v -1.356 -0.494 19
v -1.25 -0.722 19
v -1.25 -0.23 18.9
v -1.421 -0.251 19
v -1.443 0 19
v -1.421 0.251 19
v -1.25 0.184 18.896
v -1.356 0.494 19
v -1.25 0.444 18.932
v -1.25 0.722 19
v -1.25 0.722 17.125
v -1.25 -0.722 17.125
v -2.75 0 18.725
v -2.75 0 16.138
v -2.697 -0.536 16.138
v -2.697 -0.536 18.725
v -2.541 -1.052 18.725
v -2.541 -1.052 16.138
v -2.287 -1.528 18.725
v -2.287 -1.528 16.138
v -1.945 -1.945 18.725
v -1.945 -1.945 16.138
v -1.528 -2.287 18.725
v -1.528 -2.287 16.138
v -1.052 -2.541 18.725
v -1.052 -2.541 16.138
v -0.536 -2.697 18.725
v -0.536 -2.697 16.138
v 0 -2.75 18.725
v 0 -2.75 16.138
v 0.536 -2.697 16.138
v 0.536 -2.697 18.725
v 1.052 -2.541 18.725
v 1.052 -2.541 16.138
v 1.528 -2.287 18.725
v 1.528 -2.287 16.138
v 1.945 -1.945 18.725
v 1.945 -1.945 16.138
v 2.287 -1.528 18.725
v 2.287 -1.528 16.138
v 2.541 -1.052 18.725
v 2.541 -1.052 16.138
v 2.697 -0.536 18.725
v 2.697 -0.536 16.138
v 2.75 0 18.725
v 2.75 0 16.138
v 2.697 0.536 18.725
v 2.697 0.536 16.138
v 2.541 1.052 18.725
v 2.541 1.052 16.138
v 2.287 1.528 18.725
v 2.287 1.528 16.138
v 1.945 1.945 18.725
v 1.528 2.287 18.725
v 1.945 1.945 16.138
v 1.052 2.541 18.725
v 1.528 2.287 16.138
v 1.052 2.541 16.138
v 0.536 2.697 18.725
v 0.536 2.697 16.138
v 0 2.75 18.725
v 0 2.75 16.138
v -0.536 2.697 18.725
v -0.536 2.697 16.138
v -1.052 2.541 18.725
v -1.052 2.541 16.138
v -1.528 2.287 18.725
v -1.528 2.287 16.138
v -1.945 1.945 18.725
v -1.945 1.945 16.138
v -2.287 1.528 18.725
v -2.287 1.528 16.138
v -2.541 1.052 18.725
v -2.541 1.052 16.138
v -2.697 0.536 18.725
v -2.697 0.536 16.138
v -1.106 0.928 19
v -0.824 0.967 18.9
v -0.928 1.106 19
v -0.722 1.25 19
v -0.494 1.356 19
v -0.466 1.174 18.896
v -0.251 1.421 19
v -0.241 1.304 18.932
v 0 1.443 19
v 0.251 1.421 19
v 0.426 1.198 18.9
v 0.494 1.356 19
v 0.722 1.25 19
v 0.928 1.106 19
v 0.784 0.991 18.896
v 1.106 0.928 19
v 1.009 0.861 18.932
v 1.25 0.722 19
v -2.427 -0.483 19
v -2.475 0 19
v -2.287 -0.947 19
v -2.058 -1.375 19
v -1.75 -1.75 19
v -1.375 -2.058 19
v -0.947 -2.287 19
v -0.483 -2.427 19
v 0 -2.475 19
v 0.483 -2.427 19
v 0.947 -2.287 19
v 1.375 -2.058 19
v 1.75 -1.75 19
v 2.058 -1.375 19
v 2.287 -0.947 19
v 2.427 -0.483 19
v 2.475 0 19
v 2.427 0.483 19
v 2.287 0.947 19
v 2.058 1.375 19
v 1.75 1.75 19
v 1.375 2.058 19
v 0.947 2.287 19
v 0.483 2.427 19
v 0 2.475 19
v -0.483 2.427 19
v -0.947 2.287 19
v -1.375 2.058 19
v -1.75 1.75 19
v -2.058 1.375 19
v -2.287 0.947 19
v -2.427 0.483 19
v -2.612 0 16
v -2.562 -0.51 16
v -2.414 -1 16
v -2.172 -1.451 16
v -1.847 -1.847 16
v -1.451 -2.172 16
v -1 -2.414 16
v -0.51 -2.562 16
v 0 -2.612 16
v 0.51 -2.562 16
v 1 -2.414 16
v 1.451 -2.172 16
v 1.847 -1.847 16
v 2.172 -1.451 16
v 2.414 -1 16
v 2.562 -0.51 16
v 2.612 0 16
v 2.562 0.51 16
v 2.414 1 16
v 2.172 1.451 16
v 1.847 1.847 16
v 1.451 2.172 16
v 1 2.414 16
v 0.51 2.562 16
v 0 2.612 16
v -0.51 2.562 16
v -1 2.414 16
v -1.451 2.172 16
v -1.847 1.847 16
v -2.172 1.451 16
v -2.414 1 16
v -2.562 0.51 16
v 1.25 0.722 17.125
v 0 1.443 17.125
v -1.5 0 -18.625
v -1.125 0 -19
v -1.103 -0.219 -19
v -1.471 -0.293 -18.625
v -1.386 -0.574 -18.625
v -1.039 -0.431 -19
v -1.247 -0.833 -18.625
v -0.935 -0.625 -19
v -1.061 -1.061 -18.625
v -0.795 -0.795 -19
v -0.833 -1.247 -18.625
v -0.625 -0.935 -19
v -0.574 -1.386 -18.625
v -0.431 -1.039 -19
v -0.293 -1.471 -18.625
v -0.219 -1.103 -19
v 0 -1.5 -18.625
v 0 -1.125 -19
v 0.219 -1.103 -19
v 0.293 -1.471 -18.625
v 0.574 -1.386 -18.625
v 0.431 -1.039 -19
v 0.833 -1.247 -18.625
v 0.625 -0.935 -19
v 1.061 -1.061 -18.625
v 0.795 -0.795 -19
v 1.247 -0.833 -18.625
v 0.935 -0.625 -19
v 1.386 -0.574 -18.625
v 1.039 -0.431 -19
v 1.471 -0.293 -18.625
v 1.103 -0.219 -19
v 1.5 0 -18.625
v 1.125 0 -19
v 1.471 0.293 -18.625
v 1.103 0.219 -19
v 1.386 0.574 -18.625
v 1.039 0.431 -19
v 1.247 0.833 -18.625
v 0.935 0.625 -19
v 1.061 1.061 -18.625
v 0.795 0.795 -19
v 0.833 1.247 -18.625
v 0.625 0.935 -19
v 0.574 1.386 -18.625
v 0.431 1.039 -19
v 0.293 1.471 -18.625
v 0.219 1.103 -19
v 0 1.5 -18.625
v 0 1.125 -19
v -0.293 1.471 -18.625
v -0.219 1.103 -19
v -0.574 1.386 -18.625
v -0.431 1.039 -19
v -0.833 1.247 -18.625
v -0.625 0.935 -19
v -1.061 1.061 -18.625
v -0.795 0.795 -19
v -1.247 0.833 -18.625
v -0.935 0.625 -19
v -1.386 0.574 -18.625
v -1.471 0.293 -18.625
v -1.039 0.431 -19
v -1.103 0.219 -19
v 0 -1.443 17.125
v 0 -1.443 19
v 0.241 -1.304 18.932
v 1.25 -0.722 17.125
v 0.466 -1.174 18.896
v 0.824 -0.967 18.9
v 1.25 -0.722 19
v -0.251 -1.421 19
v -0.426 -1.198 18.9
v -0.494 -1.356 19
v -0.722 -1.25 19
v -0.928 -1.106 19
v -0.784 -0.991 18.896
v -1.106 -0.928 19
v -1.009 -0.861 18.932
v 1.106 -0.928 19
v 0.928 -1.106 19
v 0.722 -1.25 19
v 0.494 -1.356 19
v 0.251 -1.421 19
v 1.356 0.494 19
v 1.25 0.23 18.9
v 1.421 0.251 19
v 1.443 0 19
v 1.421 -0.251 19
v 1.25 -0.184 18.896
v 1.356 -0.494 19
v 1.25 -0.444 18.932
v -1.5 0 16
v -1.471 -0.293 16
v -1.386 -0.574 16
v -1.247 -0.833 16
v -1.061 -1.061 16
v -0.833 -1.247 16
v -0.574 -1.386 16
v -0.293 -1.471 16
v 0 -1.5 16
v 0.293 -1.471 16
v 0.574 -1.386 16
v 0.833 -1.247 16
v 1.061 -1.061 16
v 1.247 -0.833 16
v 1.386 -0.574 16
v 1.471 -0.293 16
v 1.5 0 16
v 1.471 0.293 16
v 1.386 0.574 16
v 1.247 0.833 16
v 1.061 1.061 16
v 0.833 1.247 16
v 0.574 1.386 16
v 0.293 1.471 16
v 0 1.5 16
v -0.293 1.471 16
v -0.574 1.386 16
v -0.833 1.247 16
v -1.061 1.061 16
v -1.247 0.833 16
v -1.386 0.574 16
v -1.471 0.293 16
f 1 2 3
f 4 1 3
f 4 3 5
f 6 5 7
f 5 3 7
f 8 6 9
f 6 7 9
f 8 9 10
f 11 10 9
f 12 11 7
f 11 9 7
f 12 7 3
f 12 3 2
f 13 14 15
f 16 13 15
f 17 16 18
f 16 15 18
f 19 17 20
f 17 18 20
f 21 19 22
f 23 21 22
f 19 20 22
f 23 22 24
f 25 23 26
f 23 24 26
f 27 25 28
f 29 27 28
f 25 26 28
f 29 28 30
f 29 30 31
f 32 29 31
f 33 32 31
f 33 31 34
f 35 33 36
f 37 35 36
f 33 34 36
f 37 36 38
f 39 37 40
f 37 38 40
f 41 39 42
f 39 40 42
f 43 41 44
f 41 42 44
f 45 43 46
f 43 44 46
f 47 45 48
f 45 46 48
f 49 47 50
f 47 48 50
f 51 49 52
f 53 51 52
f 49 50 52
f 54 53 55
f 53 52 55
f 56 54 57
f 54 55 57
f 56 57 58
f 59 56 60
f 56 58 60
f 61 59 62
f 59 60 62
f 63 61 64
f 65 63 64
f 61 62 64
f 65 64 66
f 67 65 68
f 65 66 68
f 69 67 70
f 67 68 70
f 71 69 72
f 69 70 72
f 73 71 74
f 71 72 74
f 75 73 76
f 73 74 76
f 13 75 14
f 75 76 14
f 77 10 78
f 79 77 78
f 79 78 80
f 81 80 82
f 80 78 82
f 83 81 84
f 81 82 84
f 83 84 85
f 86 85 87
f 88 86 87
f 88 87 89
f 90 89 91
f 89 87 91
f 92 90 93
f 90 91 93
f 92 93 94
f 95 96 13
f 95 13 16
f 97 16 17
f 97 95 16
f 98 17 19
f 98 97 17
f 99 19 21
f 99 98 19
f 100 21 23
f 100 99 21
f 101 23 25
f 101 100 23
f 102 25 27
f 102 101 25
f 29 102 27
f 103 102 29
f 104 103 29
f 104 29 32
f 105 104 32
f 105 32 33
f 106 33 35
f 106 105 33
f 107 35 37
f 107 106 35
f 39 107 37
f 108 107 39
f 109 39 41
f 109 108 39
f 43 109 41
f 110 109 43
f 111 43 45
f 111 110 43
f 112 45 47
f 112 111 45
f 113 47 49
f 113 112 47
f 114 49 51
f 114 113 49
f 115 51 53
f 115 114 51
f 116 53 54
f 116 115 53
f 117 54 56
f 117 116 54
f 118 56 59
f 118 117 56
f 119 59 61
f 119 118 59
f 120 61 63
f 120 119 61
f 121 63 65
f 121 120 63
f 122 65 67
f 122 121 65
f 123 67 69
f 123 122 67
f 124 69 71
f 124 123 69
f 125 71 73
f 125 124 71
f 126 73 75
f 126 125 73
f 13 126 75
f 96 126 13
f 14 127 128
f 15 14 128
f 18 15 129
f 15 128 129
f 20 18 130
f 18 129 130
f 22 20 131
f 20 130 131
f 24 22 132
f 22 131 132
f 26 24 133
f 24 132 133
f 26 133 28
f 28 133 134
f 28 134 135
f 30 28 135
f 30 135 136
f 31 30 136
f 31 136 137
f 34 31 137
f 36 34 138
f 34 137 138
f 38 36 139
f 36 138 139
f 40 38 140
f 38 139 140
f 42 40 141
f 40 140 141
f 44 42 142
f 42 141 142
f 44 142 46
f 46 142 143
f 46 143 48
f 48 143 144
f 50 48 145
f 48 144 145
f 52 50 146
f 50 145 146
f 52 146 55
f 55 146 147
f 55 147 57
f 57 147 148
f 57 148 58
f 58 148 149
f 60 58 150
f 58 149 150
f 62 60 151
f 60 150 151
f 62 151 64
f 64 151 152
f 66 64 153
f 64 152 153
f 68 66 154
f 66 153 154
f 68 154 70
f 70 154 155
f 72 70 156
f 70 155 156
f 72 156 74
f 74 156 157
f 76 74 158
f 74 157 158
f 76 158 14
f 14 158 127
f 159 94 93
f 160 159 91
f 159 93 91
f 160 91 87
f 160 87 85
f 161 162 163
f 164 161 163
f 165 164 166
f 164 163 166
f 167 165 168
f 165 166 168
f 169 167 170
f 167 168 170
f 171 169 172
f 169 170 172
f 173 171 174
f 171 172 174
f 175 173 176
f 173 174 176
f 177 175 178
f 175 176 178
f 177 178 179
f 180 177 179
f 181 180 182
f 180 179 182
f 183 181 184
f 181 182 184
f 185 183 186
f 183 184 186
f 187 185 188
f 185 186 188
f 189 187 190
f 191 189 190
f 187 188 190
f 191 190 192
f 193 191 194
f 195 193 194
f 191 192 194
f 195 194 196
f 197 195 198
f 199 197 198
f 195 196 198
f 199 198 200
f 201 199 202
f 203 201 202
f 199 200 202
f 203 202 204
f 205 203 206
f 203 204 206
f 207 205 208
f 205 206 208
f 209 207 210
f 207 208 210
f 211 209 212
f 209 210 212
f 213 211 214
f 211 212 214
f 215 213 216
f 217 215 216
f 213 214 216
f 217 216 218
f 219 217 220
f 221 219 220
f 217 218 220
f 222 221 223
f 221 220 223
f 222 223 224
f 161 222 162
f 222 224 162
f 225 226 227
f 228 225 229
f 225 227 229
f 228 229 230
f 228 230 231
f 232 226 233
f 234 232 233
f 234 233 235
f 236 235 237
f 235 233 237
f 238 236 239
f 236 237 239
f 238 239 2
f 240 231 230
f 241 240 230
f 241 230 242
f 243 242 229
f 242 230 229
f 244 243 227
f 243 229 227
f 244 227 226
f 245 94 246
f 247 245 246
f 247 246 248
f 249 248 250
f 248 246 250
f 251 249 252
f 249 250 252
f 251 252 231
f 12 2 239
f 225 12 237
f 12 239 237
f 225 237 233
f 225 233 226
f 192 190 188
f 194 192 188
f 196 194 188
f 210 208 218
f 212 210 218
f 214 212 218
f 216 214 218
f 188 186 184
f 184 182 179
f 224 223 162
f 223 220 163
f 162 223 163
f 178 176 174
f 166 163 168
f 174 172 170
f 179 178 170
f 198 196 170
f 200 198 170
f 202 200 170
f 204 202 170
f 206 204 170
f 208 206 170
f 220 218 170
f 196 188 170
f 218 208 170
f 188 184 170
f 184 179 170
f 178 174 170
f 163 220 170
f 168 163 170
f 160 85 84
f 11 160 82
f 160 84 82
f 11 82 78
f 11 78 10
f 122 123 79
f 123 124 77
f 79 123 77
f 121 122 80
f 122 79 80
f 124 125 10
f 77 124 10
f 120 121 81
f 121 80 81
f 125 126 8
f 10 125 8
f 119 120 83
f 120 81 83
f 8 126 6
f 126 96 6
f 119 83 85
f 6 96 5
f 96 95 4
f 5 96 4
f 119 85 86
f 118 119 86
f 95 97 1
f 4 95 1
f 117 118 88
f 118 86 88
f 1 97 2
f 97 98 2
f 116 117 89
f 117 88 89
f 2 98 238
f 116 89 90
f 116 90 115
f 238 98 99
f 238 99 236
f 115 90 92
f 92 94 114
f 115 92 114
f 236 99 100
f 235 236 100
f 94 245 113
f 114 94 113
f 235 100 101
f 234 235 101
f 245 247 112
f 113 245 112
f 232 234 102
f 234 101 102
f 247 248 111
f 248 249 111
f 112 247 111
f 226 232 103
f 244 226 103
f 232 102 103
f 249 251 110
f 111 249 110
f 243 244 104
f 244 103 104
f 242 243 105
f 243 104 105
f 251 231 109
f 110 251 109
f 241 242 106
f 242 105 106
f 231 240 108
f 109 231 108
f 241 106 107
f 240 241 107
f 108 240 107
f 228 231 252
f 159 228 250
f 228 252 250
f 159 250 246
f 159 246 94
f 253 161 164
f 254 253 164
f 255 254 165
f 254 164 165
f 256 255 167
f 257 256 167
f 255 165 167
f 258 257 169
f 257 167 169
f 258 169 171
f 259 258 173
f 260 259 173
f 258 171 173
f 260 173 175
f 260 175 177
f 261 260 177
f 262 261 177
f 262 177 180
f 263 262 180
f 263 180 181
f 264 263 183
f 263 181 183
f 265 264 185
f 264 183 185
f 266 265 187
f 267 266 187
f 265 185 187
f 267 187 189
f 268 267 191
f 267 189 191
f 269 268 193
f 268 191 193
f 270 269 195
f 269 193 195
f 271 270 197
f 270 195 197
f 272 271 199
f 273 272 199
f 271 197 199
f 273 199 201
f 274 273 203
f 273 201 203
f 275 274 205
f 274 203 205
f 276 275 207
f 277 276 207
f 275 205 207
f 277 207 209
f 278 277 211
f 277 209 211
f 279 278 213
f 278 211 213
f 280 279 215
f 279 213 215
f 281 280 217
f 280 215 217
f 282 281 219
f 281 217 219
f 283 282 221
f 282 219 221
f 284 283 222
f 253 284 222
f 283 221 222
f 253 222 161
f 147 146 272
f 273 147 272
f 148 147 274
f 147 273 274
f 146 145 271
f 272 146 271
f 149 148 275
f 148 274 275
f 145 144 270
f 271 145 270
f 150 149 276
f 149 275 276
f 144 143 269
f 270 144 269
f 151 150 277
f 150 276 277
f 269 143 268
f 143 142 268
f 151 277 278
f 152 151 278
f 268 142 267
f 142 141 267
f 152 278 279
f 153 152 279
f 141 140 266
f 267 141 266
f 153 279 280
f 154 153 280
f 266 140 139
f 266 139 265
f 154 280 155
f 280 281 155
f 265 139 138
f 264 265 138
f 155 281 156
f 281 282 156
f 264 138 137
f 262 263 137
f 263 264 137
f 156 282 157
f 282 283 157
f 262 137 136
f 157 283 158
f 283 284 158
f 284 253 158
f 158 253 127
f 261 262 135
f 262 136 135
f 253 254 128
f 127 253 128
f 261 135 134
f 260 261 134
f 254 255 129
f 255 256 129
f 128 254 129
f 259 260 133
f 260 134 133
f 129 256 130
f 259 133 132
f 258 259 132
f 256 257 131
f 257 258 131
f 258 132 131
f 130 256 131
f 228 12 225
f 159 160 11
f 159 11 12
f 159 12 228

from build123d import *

# Parameters (mm, degrees)
CUT_EXTRUDE1_DEPTH = 1.875
CHAMFER1_SIZE      = 0.275
CHAMFER2_SIZE      = 0.1375
CHAMFER3_SIZE      = 0.375


with BuildPart() as part:
    # Sketch2 → Revolve1 (revolve)
    with BuildSketch(Plane(origin=(0, 0, 0), x_dir=(0, 0, -1), z_dir=(1, 0, 0))):
        Polygon((-19, 2.75), (-16, 2.75), (-16, 1.5), (19, 1.5), (19, 0), (-19, 0), align=None)
    revolve(axis=Axis((0, 0, -19), (0, 0, 1)))

    # Sketch4 → Cut-Extrude1 (cut)
    with BuildSketch(Plane.XY.offset(19)):
        Polygon((0, 1.443375673), (-1.25, 0.721687836), (-1.25, -0.721687836), (0, -1.443375673), (1.25, -0.721687836), (1.25, 0.721687836), align=None)
    extrude(amount=-CUT_EXTRUDE1_DEPTH, mode=Mode.SUBTRACT)

    # Cut-Extrude2 cone 1 section (through the dimple's axis) → Cut-Extrude2 (revolve, cut)
    with BuildSketch(Plane(origin=(0, 0, 19), x_dir=(0, -1, 0), z_dir=(1, 0, 0))):
        Polygon((0, 0), (1.443375673, 0), (0, 0.833333333), align=None)
    revolve(axis=Axis((0, 0, 19), (0, 0, -1)), mode=Mode.SUBTRACT)

    # Chamfer1
    chamfer1_edges = [part.edges().sort_by_distance(p)[0] for p in [
        (0, -2.75, 19),
    ]]
    chamfer(chamfer1_edges, length=CHAMFER1_SIZE)

    # Chamfer2
    chamfer2_edges = [part.edges().sort_by_distance(p)[0] for p in [
        (0, -2.75, 16),
    ]]
    chamfer(chamfer2_edges, length=CHAMFER2_SIZE)

    # Chamfer3
    chamfer3_edges = [part.edges().sort_by_distance(p)[0] for p in [
        (0, -1.5, -19),
    ]]
    chamfer(chamfer3_edges, length=CHAMFER3_SIZE)


solid = part.part
